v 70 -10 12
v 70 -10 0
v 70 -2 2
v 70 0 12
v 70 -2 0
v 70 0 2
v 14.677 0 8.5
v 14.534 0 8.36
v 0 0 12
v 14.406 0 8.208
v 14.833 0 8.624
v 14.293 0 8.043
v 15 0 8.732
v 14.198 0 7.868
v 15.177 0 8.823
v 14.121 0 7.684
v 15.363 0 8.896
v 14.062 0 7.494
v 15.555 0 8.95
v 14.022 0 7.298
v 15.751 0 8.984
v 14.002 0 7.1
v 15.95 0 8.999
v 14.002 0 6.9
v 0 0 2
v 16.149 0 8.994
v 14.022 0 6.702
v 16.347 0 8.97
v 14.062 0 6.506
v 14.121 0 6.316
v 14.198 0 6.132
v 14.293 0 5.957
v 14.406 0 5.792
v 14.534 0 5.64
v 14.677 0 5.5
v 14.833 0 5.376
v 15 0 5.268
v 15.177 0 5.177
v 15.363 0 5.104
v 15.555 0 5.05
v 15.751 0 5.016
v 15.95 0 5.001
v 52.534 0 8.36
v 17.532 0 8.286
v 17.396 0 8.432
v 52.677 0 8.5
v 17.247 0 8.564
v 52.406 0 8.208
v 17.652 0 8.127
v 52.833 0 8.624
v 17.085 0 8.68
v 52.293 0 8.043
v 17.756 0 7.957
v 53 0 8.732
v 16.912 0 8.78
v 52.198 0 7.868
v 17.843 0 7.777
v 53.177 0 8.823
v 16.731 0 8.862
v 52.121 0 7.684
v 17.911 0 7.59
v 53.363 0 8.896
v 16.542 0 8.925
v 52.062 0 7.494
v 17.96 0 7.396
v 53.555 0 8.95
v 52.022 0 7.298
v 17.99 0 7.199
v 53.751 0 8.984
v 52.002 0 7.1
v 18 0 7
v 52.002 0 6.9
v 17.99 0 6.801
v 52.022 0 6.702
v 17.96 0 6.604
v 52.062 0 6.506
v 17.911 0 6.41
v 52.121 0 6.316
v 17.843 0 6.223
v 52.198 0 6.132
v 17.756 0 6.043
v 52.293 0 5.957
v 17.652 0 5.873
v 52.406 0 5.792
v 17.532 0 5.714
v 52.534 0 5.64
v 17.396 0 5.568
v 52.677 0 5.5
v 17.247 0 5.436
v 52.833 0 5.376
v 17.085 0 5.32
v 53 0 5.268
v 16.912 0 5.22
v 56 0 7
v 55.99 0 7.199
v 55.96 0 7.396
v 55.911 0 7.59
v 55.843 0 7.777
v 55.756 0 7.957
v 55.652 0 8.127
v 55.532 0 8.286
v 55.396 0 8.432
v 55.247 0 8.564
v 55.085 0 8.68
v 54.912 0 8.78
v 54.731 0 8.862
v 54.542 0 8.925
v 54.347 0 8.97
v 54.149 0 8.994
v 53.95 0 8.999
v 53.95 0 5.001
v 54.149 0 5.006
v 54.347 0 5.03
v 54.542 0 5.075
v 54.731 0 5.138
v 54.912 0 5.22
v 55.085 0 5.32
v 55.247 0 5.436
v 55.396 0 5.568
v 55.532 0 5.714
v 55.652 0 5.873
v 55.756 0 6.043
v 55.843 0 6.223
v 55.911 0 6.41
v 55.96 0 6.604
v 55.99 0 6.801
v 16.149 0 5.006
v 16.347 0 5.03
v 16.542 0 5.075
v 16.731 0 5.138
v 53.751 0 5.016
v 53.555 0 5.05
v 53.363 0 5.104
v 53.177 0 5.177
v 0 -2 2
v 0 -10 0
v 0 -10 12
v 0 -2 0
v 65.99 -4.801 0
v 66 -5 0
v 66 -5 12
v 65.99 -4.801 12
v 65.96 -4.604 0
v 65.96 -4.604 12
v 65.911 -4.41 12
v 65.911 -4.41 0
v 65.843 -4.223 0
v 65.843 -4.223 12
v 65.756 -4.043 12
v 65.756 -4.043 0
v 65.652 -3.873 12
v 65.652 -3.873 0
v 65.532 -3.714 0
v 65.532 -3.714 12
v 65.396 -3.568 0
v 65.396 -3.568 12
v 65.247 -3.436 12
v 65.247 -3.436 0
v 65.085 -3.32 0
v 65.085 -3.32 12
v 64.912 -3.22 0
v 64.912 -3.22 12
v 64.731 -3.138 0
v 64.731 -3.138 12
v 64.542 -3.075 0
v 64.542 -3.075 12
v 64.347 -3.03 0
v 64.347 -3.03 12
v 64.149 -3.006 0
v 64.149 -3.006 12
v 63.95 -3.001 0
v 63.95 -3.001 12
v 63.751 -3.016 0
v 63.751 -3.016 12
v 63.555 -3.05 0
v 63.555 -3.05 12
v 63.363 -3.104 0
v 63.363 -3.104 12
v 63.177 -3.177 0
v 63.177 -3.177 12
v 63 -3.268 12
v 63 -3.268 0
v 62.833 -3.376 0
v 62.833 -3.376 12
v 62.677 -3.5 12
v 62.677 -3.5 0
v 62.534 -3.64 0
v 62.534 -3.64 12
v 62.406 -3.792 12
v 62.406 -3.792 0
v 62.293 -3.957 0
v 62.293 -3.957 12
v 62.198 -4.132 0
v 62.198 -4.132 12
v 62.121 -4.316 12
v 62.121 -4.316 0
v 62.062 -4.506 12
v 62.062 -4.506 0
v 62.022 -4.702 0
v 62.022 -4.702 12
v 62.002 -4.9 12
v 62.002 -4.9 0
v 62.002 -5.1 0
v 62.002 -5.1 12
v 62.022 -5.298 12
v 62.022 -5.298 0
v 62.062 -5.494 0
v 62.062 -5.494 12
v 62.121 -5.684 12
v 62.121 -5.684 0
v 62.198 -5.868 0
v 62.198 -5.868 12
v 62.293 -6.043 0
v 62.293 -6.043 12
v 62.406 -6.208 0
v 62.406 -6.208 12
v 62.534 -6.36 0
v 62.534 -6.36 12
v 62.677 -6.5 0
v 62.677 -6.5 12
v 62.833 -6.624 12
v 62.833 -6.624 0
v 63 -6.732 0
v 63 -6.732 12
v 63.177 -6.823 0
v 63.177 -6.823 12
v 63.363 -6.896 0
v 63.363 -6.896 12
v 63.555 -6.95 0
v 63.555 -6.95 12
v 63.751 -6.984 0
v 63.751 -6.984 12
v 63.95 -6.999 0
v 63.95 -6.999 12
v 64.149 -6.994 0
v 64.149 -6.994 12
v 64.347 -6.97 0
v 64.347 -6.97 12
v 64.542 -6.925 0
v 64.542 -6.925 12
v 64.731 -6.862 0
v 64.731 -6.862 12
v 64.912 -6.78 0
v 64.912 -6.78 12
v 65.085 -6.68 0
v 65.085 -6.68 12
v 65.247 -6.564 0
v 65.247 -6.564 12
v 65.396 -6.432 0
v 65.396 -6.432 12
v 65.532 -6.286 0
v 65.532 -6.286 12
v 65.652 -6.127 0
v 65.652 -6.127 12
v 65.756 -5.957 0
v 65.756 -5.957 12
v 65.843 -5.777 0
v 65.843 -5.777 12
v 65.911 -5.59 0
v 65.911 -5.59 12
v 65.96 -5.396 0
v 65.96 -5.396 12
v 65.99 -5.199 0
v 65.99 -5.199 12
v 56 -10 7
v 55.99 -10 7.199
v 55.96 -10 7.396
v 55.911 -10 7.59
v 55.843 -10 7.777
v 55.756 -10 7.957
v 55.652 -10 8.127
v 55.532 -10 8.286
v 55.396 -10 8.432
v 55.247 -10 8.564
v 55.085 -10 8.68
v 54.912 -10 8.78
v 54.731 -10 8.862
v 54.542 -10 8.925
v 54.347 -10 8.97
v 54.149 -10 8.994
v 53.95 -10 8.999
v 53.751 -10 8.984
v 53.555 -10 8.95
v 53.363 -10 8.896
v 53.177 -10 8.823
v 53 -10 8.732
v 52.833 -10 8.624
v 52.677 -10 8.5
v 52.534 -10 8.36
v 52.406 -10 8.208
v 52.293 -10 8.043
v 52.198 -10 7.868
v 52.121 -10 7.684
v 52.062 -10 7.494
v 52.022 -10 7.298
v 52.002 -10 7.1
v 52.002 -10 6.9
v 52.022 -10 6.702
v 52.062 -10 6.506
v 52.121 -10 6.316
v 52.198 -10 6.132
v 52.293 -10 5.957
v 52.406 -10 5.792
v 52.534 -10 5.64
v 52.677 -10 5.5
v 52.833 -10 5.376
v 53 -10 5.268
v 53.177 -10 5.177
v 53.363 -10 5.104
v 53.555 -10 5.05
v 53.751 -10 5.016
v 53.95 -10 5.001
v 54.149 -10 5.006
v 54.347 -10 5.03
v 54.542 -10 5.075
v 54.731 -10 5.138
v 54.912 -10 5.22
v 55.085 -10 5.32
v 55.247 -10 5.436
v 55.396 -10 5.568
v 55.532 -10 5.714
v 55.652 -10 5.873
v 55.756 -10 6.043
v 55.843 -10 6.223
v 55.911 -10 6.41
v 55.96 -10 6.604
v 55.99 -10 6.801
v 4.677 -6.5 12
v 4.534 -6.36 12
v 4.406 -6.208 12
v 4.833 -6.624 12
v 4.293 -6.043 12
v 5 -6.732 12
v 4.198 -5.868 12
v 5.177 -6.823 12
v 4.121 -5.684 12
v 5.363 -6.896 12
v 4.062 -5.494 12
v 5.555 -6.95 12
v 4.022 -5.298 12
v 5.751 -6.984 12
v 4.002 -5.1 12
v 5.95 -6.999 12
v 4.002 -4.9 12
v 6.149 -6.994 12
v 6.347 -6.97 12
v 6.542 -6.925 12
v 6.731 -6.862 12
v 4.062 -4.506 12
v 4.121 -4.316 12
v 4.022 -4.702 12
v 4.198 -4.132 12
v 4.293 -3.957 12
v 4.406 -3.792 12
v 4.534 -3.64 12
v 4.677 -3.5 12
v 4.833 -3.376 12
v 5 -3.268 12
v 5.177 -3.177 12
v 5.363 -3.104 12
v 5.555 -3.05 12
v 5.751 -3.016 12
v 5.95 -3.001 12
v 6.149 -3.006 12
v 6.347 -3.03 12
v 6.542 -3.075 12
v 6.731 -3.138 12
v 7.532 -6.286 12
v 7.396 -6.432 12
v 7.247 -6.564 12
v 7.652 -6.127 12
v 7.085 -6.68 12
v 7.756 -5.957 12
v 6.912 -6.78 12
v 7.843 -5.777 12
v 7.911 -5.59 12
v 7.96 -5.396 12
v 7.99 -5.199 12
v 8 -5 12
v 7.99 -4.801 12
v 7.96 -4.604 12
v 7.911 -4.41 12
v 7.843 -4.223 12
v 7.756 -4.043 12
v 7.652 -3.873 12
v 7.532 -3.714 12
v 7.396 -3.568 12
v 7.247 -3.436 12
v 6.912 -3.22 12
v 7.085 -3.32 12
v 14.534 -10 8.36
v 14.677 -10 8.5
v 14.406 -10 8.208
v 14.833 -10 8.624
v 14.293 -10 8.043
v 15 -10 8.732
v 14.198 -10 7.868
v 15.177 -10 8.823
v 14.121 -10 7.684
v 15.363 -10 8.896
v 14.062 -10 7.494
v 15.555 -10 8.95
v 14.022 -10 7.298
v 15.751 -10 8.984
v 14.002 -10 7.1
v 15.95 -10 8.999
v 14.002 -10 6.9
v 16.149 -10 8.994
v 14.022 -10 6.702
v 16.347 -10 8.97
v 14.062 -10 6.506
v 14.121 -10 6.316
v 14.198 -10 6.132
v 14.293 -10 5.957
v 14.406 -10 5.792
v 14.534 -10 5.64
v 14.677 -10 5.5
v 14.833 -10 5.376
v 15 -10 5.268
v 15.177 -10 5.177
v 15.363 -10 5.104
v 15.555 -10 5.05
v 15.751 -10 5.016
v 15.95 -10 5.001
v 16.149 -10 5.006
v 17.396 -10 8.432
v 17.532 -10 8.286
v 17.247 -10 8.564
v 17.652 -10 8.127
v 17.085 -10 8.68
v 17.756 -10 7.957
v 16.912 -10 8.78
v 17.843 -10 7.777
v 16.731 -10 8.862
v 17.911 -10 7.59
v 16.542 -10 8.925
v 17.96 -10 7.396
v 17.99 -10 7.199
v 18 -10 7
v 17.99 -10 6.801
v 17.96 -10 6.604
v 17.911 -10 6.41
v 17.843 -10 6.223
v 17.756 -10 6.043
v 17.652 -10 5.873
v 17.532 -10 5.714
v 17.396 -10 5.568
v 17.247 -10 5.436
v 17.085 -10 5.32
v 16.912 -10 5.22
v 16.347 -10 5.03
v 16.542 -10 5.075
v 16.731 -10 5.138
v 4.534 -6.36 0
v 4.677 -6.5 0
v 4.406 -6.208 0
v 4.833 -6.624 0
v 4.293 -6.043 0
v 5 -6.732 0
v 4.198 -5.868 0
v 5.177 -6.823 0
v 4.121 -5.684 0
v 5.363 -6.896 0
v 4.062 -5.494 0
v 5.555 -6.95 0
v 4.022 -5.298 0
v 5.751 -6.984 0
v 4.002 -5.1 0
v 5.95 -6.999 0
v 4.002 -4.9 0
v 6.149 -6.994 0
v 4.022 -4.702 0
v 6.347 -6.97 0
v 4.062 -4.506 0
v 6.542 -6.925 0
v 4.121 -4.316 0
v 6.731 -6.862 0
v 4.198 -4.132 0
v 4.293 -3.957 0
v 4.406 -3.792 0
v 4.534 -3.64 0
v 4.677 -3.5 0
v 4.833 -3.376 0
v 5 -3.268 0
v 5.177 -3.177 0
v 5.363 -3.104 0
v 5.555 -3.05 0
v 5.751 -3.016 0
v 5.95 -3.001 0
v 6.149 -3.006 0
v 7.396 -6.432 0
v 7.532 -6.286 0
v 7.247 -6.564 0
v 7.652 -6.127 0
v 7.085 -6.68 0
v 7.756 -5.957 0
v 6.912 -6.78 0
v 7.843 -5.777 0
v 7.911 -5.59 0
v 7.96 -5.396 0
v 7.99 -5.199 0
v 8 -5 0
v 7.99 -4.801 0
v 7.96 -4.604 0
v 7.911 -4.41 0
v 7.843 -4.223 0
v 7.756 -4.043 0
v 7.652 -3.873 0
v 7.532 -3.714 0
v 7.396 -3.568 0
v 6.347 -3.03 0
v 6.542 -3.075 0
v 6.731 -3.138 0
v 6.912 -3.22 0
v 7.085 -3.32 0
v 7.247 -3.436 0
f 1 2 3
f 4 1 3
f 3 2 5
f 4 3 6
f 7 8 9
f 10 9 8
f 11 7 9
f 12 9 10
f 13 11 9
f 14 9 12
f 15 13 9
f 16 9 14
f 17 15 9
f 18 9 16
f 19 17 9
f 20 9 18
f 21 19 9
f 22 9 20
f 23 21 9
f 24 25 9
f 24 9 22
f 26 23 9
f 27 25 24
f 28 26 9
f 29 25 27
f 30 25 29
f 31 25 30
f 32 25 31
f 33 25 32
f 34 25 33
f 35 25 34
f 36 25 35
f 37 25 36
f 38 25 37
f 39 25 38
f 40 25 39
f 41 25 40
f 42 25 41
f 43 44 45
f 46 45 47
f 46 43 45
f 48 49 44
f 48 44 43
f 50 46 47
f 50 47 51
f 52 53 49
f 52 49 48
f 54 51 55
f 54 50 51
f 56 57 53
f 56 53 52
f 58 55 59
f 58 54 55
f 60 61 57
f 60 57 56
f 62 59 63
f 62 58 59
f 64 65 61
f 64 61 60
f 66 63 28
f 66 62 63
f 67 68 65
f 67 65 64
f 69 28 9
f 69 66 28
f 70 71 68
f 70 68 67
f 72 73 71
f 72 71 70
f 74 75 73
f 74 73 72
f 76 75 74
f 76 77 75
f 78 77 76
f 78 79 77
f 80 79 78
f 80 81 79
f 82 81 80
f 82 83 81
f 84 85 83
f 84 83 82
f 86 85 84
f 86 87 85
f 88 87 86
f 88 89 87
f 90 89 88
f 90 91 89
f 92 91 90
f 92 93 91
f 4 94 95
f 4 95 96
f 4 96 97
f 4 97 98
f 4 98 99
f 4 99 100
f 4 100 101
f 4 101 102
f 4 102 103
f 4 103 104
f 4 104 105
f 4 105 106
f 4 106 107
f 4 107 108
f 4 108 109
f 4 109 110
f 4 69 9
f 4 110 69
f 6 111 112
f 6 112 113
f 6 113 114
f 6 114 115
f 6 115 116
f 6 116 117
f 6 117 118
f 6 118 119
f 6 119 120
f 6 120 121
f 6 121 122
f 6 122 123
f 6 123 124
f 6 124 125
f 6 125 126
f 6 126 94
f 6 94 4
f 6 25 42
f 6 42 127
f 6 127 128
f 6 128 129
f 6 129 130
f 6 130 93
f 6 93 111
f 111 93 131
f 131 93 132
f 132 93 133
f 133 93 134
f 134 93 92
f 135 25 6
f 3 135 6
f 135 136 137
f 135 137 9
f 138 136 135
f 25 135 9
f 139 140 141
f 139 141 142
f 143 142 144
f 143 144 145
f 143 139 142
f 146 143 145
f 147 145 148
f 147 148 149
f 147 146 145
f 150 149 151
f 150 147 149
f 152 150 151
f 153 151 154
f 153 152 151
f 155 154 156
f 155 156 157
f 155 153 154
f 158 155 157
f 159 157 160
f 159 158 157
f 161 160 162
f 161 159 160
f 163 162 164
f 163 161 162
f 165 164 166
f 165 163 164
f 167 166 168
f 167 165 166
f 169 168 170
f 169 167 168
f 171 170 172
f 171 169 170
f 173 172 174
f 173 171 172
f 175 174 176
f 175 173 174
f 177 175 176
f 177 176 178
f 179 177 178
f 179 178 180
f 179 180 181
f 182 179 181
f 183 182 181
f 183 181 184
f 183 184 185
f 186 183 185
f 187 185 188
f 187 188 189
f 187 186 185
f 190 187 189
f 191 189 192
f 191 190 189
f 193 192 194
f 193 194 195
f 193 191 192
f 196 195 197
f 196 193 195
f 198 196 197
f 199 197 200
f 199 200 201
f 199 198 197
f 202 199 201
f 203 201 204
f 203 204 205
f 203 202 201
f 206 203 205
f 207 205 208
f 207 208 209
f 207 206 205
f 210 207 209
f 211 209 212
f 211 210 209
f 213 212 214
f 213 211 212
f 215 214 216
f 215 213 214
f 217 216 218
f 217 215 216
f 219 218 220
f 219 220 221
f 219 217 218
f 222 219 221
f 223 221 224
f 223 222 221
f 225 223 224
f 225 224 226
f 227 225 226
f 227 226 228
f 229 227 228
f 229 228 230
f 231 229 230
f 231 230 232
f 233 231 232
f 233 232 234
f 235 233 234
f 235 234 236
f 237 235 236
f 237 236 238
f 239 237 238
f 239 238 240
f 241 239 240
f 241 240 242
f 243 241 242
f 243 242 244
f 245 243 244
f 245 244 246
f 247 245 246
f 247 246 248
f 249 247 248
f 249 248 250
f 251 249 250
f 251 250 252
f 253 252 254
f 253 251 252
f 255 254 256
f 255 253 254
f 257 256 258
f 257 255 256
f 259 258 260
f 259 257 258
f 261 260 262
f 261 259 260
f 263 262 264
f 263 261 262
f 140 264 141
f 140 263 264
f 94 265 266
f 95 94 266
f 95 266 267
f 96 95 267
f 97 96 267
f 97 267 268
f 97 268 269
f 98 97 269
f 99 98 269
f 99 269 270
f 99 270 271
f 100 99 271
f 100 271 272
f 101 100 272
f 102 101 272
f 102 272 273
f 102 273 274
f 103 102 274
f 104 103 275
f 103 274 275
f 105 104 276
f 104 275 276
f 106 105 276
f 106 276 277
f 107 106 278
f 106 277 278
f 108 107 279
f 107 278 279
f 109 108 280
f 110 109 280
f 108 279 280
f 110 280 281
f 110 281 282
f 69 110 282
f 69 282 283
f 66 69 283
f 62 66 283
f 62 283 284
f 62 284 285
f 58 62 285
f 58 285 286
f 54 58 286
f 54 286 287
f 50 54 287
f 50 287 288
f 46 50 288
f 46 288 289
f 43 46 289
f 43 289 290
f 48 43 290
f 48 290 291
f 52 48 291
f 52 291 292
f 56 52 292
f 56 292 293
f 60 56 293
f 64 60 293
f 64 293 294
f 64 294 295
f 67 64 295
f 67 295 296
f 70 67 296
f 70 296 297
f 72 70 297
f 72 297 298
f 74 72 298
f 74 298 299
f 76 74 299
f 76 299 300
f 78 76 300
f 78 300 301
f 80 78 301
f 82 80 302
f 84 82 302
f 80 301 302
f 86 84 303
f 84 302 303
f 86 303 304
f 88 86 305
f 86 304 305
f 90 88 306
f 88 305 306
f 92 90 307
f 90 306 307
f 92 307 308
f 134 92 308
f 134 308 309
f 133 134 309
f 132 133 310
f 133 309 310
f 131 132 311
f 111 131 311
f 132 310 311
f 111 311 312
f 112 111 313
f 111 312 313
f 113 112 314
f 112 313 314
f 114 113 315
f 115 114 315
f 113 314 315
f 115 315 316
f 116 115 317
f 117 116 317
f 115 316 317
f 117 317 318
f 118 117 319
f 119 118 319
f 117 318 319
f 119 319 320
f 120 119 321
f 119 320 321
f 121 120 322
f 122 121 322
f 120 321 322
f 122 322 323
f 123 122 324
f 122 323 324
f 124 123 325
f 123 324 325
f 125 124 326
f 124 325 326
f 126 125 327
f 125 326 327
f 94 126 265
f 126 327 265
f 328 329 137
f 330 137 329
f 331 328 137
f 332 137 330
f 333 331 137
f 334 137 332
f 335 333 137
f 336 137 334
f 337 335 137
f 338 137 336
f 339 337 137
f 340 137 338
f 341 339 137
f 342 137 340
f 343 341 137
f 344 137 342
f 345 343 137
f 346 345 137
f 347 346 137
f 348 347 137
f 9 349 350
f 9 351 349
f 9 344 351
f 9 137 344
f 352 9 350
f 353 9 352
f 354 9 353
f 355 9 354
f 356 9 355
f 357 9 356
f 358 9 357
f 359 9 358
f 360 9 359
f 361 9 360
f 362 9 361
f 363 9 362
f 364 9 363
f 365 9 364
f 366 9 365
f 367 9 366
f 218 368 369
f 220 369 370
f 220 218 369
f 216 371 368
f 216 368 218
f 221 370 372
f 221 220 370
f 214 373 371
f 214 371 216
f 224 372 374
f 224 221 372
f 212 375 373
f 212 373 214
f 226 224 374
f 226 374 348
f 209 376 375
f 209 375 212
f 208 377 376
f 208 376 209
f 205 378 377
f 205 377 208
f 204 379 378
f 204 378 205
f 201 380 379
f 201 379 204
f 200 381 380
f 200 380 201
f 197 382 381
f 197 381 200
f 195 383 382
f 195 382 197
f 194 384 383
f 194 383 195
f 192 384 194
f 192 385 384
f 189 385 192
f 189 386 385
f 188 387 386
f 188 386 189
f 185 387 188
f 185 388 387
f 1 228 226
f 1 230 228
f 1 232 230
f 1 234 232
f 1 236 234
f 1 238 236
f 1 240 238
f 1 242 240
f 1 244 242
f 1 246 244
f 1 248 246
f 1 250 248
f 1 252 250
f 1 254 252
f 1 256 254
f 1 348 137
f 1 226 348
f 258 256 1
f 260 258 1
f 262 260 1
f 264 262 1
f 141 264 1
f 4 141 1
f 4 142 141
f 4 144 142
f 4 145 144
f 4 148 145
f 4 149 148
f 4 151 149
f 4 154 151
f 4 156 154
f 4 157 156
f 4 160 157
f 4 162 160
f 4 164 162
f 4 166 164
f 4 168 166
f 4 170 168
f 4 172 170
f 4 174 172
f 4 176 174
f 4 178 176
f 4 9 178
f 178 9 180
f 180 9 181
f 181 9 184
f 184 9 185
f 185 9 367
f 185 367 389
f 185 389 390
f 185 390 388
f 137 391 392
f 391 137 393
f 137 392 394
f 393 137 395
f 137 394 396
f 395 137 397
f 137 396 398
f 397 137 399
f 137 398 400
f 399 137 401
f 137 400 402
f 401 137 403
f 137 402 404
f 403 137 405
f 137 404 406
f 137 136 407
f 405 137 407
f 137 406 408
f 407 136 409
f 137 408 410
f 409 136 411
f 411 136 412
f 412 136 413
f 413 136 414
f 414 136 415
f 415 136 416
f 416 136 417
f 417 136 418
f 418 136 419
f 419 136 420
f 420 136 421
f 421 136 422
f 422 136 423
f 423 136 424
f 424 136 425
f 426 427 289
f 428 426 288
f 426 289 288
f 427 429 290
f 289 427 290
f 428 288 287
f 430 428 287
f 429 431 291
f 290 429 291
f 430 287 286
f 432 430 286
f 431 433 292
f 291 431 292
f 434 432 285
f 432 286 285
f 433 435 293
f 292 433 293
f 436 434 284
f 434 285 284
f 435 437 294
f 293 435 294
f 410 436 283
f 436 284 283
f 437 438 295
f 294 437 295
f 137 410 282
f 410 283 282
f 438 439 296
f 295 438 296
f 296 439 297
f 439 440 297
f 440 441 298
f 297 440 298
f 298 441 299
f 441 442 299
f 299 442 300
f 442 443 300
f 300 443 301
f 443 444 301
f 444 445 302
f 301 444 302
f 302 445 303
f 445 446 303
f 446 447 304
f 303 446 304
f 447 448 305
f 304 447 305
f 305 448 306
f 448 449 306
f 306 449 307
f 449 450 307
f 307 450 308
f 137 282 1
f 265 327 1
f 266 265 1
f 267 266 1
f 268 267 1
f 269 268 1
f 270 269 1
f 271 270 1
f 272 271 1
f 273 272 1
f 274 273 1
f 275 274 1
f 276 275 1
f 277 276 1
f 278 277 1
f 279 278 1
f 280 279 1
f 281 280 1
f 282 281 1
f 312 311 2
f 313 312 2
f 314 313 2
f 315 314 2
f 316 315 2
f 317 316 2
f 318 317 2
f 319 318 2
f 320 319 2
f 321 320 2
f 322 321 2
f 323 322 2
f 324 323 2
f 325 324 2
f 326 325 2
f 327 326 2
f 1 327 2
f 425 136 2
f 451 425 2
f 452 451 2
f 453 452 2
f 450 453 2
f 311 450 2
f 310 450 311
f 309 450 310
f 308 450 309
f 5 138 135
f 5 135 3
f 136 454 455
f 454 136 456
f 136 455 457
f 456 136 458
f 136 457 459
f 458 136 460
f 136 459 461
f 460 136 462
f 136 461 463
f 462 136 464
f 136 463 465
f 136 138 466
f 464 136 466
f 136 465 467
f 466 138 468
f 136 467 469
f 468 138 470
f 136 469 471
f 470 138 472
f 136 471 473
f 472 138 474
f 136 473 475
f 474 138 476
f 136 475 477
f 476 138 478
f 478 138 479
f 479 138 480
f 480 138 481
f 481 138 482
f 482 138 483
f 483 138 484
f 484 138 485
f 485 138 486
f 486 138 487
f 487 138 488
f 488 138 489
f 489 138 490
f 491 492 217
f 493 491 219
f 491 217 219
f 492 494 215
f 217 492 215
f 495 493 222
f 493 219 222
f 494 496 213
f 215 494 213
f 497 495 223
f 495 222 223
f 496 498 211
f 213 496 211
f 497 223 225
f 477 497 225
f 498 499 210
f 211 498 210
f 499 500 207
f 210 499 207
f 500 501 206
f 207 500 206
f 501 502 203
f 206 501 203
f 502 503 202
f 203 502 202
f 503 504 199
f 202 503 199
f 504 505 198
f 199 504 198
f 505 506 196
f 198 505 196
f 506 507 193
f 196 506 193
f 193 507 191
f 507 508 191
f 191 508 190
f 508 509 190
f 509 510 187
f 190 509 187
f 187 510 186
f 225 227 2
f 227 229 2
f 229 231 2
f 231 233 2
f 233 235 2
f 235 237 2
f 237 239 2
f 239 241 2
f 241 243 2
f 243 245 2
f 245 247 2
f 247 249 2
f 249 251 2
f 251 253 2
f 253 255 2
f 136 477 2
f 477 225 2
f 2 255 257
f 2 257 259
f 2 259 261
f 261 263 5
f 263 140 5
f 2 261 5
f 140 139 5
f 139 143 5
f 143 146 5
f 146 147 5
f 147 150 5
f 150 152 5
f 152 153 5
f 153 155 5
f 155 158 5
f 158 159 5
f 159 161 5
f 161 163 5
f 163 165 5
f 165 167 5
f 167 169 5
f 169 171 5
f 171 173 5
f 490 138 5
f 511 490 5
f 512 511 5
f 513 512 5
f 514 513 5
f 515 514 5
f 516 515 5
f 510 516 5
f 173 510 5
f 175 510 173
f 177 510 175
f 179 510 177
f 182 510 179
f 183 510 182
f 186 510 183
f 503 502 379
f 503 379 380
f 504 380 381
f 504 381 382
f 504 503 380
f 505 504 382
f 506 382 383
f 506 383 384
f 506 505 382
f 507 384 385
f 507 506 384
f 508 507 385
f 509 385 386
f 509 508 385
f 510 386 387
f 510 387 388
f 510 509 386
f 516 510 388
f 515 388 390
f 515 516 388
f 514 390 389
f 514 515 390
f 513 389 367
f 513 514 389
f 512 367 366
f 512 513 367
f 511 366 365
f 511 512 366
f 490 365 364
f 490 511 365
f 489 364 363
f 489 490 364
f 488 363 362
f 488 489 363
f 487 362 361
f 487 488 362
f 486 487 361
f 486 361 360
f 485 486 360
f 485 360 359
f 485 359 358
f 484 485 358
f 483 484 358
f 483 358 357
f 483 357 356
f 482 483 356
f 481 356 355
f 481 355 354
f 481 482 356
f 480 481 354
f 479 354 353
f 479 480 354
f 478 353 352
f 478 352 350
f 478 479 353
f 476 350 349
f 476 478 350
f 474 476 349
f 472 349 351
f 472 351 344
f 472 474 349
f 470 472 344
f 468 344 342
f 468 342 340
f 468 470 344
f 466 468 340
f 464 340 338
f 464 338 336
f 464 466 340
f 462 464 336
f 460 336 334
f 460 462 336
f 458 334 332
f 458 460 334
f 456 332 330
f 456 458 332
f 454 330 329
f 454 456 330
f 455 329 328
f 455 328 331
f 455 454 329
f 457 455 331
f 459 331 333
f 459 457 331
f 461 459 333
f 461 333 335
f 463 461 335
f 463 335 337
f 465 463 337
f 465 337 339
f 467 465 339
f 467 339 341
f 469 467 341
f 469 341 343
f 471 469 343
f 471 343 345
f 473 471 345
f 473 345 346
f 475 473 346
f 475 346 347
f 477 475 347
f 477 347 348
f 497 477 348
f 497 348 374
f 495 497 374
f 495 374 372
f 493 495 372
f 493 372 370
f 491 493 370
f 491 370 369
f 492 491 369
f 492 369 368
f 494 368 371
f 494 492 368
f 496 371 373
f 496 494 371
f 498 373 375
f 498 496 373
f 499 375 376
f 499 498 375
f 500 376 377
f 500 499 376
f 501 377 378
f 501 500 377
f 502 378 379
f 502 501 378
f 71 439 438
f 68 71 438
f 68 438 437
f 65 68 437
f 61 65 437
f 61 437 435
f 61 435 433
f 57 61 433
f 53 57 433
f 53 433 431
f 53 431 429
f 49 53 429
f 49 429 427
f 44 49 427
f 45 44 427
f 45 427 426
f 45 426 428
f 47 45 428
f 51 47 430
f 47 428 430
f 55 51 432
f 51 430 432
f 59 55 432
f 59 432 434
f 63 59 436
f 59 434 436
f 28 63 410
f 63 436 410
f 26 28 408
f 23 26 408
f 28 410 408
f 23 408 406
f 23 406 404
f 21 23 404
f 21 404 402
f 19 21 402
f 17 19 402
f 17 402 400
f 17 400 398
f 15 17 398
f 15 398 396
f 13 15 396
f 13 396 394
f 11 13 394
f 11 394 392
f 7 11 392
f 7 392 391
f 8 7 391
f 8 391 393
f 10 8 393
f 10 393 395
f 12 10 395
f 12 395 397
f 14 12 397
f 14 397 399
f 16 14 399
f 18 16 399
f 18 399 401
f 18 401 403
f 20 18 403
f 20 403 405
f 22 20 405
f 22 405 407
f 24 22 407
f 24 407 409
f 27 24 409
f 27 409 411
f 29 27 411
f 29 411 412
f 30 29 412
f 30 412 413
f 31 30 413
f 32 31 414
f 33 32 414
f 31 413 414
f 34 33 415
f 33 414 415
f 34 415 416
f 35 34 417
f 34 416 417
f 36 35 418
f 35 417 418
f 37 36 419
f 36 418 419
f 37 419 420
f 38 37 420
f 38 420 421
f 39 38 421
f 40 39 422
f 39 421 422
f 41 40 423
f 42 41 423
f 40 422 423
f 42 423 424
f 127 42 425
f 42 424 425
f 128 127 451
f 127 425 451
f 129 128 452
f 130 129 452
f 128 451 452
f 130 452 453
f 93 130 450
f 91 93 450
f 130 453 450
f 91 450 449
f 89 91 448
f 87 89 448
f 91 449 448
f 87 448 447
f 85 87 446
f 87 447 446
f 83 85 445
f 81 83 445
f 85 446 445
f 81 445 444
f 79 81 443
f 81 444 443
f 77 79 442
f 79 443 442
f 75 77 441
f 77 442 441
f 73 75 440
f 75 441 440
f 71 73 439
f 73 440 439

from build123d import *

# Parameters (mm, degrees)
F0_W     = 70
F0_H     = 10
F0_R     = 2
F1_DEPTH = 12
F2_W     = 70
F2_H     = 2
F3_DEPTH = 2
F4_R     = 2
F5_DEPTH = 25


with BuildPart() as f1:
    # F0 (on Top) → F1 (new body)
    with BuildSketch(Plane.XY):
        with Locations((35, -5)):
            Rectangle(F0_W, F0_H)
        with Locations((6, -5)):
            Circle(F0_R, mode=Mode.SUBTRACT)
        with Locations((64, -5)):
            Circle(F0_R, mode=Mode.SUBTRACT)
    extrude(amount=F1_DEPTH)

    # F2 (on Top) → F3 (cut)
    with BuildSketch(Plane.XY):
        with Locations((35, -1)):
            Rectangle(F2_W, F2_H)
    extrude(amount=F3_DEPTH, mode=Mode.SUBTRACT)

    # F4 (on face) → F5 (cut)
    with BuildSketch(Plane.XZ.offset(10)):
        with Locations((16, 7)):
            Circle(F4_R)
        with Locations((54, 7)):
            Circle(F4_R)
    extrude(amount=-F5_DEPTH, mode=Mode.SUBTRACT)


solid = f1.part
